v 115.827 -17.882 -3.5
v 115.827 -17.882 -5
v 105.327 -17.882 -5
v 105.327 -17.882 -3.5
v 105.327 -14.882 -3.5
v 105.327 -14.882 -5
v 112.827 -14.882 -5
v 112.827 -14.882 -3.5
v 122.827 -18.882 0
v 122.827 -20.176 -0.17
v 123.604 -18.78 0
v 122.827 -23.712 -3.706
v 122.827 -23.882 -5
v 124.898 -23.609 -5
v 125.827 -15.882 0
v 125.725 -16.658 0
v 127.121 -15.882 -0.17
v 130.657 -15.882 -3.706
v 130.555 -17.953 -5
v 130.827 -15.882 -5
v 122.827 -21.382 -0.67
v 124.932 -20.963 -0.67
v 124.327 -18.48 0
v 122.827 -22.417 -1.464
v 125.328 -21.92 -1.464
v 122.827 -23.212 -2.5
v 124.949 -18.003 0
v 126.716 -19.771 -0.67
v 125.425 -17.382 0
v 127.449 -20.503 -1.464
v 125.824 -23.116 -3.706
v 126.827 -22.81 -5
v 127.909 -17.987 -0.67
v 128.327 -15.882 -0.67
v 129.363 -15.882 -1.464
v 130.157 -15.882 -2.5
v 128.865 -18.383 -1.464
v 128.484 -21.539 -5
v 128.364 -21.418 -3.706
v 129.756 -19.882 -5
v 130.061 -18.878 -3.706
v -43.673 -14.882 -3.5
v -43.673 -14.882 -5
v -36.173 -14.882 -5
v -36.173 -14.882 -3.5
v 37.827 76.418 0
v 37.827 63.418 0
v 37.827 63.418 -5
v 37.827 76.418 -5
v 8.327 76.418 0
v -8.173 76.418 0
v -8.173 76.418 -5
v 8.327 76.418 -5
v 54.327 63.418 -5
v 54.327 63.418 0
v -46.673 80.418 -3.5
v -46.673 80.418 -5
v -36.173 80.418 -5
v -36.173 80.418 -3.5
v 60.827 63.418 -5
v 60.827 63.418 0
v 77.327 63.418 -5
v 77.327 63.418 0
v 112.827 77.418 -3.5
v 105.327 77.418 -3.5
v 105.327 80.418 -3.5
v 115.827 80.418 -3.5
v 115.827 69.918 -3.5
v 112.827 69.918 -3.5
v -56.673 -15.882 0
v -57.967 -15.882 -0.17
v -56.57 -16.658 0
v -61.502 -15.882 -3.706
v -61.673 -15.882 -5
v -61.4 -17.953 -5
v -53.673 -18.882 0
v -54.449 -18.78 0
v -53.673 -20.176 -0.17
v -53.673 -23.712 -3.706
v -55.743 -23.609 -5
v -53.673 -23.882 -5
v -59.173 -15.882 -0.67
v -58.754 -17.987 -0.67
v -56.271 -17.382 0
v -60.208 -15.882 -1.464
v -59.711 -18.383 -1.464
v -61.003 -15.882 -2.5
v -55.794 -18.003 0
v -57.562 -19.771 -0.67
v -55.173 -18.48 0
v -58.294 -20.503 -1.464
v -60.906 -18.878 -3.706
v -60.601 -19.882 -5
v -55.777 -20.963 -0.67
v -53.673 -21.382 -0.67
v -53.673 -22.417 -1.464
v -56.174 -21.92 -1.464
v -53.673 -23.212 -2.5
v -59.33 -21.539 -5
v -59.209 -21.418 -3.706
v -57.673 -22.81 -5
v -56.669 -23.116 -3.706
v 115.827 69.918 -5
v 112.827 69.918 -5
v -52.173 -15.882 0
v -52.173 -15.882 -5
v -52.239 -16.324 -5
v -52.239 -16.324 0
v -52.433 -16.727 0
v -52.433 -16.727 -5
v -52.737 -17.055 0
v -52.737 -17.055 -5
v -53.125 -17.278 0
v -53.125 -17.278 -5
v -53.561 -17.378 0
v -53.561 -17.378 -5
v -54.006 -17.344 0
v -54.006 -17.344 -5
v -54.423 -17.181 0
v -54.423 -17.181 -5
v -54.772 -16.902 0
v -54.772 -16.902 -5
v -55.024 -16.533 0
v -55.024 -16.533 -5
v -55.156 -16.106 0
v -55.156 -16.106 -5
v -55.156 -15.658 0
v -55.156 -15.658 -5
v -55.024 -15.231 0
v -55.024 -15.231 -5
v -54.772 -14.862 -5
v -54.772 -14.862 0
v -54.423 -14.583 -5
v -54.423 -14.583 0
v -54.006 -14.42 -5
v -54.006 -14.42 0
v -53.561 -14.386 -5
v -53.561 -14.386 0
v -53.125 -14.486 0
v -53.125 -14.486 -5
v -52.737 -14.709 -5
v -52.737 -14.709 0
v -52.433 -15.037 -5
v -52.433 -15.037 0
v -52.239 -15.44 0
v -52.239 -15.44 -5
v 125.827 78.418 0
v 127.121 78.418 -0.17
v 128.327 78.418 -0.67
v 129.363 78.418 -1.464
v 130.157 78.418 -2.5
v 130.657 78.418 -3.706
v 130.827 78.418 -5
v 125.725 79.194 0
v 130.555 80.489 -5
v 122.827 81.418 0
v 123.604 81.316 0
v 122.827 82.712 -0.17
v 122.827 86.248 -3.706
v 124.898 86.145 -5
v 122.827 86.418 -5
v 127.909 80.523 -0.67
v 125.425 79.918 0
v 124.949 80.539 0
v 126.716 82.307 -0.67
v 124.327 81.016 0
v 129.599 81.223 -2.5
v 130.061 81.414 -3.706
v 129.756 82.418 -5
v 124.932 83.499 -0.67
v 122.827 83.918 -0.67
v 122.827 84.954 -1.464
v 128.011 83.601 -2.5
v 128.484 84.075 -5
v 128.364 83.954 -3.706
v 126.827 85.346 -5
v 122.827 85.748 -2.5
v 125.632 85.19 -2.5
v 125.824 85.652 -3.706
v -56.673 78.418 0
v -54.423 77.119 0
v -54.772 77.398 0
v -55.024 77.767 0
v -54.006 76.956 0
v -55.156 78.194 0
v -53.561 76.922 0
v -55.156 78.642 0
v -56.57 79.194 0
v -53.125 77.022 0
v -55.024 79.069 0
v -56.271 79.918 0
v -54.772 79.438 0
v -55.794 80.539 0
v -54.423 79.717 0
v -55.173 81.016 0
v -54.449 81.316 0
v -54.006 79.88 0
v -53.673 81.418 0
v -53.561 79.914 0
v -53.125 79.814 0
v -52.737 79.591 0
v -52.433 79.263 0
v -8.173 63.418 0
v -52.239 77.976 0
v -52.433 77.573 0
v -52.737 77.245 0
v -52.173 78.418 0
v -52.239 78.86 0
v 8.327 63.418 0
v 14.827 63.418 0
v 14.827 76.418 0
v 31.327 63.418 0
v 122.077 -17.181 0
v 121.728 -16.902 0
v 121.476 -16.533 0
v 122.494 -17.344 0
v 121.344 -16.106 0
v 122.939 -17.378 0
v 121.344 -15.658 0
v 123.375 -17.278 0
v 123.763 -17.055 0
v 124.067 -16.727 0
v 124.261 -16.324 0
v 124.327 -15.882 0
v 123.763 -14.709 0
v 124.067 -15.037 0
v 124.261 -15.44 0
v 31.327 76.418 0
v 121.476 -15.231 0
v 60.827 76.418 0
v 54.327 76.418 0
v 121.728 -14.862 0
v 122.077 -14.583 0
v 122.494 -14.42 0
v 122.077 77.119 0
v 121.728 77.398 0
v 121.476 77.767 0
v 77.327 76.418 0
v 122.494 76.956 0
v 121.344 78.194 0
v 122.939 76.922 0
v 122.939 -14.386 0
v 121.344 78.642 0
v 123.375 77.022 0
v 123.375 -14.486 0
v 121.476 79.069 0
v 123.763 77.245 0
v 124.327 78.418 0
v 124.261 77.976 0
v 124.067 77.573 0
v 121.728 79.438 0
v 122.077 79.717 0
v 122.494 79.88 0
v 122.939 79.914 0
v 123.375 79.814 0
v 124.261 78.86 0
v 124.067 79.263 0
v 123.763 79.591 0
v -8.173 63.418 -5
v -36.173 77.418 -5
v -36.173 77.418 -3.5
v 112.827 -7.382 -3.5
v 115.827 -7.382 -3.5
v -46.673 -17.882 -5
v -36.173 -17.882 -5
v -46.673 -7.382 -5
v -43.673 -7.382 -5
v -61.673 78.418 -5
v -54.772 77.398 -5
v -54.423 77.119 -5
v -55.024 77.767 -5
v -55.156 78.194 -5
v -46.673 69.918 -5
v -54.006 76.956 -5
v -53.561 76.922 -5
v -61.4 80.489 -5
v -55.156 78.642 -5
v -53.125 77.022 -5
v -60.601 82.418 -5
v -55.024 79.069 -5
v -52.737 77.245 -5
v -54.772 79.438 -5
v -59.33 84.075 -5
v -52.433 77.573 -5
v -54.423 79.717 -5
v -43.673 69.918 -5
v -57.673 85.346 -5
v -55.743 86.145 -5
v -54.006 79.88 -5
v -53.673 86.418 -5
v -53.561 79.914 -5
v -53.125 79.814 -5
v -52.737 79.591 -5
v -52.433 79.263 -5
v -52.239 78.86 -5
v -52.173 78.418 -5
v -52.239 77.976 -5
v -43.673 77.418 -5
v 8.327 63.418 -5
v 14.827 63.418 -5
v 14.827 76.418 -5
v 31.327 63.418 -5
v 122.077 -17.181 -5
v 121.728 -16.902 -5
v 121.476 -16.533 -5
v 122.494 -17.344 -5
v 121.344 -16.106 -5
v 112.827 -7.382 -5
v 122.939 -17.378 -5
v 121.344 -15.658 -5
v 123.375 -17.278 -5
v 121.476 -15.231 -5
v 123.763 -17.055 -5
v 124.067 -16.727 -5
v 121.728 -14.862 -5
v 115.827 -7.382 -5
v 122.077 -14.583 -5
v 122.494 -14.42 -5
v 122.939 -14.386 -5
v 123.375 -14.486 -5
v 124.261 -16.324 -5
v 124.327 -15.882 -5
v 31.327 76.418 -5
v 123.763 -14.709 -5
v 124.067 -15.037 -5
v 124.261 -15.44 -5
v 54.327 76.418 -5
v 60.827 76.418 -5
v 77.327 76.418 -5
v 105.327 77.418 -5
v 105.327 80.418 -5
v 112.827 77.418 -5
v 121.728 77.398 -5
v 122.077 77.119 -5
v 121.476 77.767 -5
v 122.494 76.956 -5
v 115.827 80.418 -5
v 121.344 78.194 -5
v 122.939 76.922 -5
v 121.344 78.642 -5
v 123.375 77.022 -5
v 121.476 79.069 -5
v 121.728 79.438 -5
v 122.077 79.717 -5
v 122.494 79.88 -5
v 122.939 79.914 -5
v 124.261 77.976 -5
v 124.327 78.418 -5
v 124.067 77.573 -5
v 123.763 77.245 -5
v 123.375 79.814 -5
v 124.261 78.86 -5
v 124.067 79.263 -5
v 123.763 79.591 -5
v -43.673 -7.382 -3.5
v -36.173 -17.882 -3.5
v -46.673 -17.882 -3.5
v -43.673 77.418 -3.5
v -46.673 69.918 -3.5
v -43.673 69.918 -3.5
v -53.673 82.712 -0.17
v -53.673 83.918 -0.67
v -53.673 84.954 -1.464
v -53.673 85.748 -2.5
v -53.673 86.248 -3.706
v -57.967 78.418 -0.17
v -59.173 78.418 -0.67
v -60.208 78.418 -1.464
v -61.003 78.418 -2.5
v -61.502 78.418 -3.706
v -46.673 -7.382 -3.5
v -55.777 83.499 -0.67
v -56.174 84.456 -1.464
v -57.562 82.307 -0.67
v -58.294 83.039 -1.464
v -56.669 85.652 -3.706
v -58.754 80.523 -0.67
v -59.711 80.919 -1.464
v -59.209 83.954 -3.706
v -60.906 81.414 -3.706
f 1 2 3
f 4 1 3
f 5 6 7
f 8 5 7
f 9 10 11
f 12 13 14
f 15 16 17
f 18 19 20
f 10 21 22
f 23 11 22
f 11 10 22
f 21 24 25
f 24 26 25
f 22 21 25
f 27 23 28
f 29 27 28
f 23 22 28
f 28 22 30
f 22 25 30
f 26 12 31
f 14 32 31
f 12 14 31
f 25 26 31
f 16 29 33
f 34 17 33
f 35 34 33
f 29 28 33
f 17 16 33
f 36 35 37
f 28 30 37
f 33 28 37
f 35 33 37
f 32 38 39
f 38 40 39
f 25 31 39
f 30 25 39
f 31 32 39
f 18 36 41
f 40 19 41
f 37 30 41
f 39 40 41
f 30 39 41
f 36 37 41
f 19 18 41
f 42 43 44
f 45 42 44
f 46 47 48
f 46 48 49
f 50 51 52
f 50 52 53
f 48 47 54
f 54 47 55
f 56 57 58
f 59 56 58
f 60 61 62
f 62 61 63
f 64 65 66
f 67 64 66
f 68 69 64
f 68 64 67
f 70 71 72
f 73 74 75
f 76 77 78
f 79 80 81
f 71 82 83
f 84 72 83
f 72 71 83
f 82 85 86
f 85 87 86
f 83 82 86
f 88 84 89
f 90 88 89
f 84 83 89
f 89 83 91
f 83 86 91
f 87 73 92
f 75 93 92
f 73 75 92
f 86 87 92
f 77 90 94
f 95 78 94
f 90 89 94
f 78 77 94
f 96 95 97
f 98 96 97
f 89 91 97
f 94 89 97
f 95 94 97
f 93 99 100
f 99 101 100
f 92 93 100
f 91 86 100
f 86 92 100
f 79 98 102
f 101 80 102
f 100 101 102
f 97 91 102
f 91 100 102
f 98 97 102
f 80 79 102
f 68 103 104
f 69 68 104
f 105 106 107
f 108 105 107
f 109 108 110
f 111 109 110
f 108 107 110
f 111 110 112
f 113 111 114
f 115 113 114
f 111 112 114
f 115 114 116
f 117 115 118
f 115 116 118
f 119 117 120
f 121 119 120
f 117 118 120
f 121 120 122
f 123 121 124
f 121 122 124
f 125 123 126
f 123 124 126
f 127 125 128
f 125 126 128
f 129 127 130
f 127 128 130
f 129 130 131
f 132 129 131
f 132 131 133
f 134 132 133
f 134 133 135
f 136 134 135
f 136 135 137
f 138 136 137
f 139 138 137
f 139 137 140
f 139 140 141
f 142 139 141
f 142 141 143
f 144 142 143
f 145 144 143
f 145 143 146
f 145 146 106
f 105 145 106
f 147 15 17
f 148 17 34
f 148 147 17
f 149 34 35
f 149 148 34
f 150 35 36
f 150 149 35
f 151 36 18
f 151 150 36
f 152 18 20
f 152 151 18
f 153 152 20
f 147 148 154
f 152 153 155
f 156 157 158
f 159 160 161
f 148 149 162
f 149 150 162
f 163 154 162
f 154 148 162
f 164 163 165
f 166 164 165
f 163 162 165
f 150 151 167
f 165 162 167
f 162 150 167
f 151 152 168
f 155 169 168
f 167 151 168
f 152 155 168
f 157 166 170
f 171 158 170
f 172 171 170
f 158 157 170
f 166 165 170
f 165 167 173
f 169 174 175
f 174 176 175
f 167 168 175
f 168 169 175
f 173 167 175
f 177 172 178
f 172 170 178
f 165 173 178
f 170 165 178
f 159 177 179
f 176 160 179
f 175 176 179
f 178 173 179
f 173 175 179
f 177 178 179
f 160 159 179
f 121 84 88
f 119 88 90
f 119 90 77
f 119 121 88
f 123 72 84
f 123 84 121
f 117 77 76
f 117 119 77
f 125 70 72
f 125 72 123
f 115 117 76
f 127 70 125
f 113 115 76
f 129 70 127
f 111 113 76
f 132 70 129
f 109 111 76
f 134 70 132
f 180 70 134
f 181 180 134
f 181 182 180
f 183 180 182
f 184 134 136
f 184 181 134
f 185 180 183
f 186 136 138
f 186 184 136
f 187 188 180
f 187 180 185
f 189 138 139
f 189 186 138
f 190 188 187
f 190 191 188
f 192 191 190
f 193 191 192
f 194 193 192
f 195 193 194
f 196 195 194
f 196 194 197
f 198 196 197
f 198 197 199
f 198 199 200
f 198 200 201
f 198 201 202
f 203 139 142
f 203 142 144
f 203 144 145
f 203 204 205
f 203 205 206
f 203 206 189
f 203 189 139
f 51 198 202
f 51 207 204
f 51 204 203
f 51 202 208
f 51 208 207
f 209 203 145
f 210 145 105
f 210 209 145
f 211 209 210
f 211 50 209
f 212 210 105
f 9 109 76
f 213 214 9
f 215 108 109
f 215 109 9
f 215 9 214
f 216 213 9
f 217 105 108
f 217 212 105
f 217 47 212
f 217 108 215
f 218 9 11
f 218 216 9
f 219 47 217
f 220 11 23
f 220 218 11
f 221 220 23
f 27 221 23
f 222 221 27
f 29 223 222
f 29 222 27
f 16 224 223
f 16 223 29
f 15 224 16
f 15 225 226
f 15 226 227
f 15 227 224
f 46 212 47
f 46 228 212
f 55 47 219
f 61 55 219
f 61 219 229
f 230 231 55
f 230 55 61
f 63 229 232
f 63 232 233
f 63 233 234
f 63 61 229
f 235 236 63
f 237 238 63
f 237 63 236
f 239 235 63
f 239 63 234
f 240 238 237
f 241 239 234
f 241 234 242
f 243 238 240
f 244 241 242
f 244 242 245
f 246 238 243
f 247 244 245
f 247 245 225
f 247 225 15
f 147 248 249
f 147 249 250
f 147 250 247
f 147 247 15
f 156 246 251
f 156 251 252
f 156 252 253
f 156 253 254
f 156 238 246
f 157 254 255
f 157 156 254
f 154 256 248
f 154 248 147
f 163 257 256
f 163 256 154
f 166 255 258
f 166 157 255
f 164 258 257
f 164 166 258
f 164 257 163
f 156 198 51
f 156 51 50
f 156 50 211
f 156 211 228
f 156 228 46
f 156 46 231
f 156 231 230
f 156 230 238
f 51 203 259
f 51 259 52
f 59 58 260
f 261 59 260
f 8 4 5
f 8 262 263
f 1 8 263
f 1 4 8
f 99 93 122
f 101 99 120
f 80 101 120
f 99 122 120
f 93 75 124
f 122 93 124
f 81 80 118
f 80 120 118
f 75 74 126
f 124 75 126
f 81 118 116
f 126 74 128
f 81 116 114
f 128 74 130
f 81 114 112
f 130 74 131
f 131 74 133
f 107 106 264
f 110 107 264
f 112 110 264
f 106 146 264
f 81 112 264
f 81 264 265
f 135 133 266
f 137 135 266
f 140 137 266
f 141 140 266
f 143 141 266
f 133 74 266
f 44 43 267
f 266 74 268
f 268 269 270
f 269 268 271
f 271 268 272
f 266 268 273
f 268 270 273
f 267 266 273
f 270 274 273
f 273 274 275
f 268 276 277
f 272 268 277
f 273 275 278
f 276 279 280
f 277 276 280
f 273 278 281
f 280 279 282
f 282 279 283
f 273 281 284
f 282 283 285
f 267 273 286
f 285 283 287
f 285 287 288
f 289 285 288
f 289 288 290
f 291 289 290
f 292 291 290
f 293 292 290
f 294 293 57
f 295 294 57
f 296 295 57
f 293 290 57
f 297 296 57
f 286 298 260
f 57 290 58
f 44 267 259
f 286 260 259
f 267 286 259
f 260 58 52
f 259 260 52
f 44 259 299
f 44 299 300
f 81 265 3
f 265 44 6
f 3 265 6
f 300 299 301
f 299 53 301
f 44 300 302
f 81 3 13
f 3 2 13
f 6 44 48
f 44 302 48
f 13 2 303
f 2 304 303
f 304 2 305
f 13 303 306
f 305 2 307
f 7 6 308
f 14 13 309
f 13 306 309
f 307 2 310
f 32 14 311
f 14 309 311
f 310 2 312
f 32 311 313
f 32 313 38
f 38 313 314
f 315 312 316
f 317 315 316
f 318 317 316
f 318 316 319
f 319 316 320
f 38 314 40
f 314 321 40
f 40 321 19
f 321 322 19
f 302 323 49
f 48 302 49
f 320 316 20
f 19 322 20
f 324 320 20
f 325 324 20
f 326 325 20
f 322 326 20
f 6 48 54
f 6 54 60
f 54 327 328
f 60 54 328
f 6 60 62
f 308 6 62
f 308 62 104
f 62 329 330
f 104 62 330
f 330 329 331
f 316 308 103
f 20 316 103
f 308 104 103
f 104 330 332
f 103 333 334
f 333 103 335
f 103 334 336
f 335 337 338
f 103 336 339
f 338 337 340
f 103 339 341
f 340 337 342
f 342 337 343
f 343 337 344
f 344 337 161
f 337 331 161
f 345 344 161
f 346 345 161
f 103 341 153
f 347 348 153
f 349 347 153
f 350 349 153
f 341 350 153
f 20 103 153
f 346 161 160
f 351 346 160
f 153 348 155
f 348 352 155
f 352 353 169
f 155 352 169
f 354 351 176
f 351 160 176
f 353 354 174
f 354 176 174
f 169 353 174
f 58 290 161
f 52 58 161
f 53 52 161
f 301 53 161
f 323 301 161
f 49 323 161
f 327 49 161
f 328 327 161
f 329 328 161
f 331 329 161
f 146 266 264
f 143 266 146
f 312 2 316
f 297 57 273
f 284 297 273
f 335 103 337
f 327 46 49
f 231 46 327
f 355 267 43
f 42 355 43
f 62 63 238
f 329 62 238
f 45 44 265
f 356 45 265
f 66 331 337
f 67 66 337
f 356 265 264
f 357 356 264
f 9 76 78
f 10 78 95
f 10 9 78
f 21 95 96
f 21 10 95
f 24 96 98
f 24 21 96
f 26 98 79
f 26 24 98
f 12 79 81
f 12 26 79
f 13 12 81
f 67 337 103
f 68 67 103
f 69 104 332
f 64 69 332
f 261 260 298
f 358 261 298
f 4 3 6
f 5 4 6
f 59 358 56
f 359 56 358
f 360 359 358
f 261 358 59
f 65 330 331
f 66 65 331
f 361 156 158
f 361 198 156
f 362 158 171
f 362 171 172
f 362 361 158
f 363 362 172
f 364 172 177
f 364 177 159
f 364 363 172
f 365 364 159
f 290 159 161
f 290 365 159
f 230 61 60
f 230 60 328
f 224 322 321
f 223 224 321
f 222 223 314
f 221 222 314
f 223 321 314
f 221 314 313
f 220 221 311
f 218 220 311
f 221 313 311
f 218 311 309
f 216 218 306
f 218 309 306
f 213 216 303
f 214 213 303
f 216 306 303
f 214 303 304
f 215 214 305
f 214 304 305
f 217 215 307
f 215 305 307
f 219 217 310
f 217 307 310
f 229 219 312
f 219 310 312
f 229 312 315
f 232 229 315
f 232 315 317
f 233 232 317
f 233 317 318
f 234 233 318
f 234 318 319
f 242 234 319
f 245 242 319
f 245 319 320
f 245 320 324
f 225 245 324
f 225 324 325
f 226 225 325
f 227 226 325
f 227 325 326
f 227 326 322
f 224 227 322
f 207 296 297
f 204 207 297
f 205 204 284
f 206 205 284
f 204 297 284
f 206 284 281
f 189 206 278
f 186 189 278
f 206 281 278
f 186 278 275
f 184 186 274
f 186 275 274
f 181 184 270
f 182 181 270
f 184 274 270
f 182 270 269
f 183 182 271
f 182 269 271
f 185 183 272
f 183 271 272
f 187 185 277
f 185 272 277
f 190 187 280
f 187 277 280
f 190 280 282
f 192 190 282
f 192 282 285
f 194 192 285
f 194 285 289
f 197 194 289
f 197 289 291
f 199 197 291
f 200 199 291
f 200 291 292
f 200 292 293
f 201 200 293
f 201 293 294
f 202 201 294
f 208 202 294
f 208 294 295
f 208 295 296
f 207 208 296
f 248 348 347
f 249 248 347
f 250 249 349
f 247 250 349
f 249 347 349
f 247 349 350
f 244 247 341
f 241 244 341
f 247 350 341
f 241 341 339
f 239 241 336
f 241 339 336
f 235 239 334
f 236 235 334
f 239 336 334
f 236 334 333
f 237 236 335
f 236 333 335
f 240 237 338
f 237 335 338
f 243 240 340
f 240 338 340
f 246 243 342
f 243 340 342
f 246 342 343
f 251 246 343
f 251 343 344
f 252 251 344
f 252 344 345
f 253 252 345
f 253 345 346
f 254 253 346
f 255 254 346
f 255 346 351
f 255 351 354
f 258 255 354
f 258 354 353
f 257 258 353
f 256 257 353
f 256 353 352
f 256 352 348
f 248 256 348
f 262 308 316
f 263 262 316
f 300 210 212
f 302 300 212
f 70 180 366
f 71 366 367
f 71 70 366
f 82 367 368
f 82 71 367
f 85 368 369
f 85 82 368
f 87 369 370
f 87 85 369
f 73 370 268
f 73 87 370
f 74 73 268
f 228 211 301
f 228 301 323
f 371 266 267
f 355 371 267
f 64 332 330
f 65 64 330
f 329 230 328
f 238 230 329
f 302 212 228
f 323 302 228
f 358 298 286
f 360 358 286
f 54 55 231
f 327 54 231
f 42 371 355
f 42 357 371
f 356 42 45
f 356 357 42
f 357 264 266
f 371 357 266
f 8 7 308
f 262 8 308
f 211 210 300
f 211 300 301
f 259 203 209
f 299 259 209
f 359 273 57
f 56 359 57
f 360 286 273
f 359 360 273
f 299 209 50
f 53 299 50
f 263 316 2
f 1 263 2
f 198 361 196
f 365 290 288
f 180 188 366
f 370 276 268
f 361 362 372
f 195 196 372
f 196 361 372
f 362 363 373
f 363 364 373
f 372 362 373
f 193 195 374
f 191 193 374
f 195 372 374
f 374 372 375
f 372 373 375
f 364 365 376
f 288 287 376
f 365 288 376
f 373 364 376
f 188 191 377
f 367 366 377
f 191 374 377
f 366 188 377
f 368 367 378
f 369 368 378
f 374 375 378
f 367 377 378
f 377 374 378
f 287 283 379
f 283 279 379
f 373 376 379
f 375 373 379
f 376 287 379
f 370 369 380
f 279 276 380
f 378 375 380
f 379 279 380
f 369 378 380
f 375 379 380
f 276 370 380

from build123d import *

# Parameters (mm, degrees)
F1_DEPTH = 5
F2_R     = 1.5
F3_DEPTH = 5.001
F4_DEPTH = 25
F5_R     = 4.99999
F6_W     = 16.5
F6_H     = 13
F7_DEPTH = 5.001
F9_DEPTH = 1.5


# Not quite as in the source:
# - a fillet or chamfer is up to 0.001 mm smaller than in the source, because OpenCascade refuses the exact size


with BuildPart() as f1:
    # F0 (on Top) → F1 (new body)
    with BuildSketch(Plane.XY):
        with BuildLine():
            ThreePointArc((-61.6726832837, -15.8819631437), (-59.3295375332, -21.5388173932), (-53.6726832837, -23.8819631437))
            Line((-53.6726832837, -23.8819631437), (122.8273167163, -23.8819631437))
            ThreePointArc((122.8273167163, -23.8819631437), (128.4841709658, -21.5388173932), (130.8273167163, -15.8819631437))
            Line((130.8273167163, -15.8819631437), (130.8273167163, 78.4180368563))
            ThreePointArc((130.8273167163, 78.4180368563), (128.4841709658, 84.0748911058), (122.8273167163, 86.4180368563))
            Line((122.8273167163, 86.4180368563), (-53.6726832837, 86.4180368563))
            ThreePointArc((-53.6726832837, 86.4180368563), (-59.3295375332, 84.0748911058), (-61.6726832837, 78.4180368563))
            Line((-61.6726832837, 78.4180368563), (-61.6726832837, -15.8819631437))
        make_face()
    extrude(amount=-F1_DEPTH)

    # F2 (on face) → F3 (cut, through all)
    with BuildSketch(Plane(origin=(0, 0, -5), x_dir=(1, 0, 0), z_dir=(0, 0, -1))):
        with Locations((-53.6726832837, 15.8819631437)):
            Circle(F2_R)
        with Locations((122.8273167163, 15.8819631437)):
            Circle(F2_R)
        with Locations((122.8273167163, -78.4180368563)):
            Circle(F2_R)
        with Locations((-53.6726832837, -78.4180368563)):
            Circle(F2_R)
    extrude(amount=-F3_DEPTH, mode=Mode.SUBTRACT)

    # F4 (cut): a face of the model
    f4_faces = [f1.faces().sort_by_distance(p)[0] for p in [
        (34.5773167163, 31.2680368563, -5),
    ]]
    extrude(f4_faces, amount=F4_DEPTH, mode=Mode.SUBTRACT)

    # F5 (radius 5 in the source; OpenCascade refuses exactly that, so slightly less here)
    f5_edges = [f1.edges().sort_by_distance(p)[0] for p in [
        (34.577317, 86.418037, 0),
        (128.484171, 84.074891, 0),
        (130.827317, 31.268037, 0),
        (128.484171, -21.538817, 0),
        (34.577317, -23.881963, 0),
        (-59.329538, -21.538817, 0),
        (-61.672683, 31.268037, 0),
        (-59.329538, 84.074891, 0),
    ]]
    fillet(f5_edges, radius=F5_R)

    # F6 (on face) → F7 (cut, through all)
    with BuildSketch(Plane.XY):
        with Locations((0.0773167163, 69.9180368563)):
            Rectangle(F6_W, F6_H)
        with Locations((23.0773167163, 69.9180368563)):
            Rectangle(F6_W, F6_H)
        with Locations((46.0773167163, 69.9180368563)):
            Rectangle(F6_W, F6_H)
        with Locations((69.0773167163, 69.9180368563)):
            Rectangle(F6_W, F6_H)
    extrude(amount=-F7_DEPTH, mode=Mode.SUBTRACT)

    # F8 (on face) → F9 (cut)
    with BuildSketch(Plane(origin=(0, 0, -5), x_dir=(1, 0, 0), z_dir=(0, 0, -1))):
        Polygon((-43.6726832837, -69.9180368563), (-46.6726832837, -69.9180368563), (-46.6726832837, -80.4180368563), (-36.1726832837, -80.4180368563), (-36.1726832837, -77.4180368563), (-43.6726832837, -77.4180368563), align=None)
        Polygon((-46.6726832837, 7.3819631437), (-43.6726832837, 7.3819631437), (-43.6726832837, 14.8819631437), (-36.1726832837, 14.8819631437), (-36.1726832837, 17.8819631437), (-46.6726832837, 17.8819631437), align=None)
        Polygon((115.8273167163, 17.8819631437), (105.3273167163, 17.8819631437), (105.3273167163, 14.8819631437), (112.8273167163, 14.8819631437), (112.8273167163, 7.3819631437), (115.8273167163, 7.3819631437), align=None)
        Polygon((115.8273167163, -69.9180368563), (112.8273167163, -69.9180368563), (112.8273167163, -77.4180368563), (105.3273167163, -77.4180368563), (105.3273167163, -80.4180368563), (115.8273167163, -80.4180368563), align=None)
    extrude(amount=-F9_DEPTH, mode=Mode.SUBTRACT)


solid = f1.part
